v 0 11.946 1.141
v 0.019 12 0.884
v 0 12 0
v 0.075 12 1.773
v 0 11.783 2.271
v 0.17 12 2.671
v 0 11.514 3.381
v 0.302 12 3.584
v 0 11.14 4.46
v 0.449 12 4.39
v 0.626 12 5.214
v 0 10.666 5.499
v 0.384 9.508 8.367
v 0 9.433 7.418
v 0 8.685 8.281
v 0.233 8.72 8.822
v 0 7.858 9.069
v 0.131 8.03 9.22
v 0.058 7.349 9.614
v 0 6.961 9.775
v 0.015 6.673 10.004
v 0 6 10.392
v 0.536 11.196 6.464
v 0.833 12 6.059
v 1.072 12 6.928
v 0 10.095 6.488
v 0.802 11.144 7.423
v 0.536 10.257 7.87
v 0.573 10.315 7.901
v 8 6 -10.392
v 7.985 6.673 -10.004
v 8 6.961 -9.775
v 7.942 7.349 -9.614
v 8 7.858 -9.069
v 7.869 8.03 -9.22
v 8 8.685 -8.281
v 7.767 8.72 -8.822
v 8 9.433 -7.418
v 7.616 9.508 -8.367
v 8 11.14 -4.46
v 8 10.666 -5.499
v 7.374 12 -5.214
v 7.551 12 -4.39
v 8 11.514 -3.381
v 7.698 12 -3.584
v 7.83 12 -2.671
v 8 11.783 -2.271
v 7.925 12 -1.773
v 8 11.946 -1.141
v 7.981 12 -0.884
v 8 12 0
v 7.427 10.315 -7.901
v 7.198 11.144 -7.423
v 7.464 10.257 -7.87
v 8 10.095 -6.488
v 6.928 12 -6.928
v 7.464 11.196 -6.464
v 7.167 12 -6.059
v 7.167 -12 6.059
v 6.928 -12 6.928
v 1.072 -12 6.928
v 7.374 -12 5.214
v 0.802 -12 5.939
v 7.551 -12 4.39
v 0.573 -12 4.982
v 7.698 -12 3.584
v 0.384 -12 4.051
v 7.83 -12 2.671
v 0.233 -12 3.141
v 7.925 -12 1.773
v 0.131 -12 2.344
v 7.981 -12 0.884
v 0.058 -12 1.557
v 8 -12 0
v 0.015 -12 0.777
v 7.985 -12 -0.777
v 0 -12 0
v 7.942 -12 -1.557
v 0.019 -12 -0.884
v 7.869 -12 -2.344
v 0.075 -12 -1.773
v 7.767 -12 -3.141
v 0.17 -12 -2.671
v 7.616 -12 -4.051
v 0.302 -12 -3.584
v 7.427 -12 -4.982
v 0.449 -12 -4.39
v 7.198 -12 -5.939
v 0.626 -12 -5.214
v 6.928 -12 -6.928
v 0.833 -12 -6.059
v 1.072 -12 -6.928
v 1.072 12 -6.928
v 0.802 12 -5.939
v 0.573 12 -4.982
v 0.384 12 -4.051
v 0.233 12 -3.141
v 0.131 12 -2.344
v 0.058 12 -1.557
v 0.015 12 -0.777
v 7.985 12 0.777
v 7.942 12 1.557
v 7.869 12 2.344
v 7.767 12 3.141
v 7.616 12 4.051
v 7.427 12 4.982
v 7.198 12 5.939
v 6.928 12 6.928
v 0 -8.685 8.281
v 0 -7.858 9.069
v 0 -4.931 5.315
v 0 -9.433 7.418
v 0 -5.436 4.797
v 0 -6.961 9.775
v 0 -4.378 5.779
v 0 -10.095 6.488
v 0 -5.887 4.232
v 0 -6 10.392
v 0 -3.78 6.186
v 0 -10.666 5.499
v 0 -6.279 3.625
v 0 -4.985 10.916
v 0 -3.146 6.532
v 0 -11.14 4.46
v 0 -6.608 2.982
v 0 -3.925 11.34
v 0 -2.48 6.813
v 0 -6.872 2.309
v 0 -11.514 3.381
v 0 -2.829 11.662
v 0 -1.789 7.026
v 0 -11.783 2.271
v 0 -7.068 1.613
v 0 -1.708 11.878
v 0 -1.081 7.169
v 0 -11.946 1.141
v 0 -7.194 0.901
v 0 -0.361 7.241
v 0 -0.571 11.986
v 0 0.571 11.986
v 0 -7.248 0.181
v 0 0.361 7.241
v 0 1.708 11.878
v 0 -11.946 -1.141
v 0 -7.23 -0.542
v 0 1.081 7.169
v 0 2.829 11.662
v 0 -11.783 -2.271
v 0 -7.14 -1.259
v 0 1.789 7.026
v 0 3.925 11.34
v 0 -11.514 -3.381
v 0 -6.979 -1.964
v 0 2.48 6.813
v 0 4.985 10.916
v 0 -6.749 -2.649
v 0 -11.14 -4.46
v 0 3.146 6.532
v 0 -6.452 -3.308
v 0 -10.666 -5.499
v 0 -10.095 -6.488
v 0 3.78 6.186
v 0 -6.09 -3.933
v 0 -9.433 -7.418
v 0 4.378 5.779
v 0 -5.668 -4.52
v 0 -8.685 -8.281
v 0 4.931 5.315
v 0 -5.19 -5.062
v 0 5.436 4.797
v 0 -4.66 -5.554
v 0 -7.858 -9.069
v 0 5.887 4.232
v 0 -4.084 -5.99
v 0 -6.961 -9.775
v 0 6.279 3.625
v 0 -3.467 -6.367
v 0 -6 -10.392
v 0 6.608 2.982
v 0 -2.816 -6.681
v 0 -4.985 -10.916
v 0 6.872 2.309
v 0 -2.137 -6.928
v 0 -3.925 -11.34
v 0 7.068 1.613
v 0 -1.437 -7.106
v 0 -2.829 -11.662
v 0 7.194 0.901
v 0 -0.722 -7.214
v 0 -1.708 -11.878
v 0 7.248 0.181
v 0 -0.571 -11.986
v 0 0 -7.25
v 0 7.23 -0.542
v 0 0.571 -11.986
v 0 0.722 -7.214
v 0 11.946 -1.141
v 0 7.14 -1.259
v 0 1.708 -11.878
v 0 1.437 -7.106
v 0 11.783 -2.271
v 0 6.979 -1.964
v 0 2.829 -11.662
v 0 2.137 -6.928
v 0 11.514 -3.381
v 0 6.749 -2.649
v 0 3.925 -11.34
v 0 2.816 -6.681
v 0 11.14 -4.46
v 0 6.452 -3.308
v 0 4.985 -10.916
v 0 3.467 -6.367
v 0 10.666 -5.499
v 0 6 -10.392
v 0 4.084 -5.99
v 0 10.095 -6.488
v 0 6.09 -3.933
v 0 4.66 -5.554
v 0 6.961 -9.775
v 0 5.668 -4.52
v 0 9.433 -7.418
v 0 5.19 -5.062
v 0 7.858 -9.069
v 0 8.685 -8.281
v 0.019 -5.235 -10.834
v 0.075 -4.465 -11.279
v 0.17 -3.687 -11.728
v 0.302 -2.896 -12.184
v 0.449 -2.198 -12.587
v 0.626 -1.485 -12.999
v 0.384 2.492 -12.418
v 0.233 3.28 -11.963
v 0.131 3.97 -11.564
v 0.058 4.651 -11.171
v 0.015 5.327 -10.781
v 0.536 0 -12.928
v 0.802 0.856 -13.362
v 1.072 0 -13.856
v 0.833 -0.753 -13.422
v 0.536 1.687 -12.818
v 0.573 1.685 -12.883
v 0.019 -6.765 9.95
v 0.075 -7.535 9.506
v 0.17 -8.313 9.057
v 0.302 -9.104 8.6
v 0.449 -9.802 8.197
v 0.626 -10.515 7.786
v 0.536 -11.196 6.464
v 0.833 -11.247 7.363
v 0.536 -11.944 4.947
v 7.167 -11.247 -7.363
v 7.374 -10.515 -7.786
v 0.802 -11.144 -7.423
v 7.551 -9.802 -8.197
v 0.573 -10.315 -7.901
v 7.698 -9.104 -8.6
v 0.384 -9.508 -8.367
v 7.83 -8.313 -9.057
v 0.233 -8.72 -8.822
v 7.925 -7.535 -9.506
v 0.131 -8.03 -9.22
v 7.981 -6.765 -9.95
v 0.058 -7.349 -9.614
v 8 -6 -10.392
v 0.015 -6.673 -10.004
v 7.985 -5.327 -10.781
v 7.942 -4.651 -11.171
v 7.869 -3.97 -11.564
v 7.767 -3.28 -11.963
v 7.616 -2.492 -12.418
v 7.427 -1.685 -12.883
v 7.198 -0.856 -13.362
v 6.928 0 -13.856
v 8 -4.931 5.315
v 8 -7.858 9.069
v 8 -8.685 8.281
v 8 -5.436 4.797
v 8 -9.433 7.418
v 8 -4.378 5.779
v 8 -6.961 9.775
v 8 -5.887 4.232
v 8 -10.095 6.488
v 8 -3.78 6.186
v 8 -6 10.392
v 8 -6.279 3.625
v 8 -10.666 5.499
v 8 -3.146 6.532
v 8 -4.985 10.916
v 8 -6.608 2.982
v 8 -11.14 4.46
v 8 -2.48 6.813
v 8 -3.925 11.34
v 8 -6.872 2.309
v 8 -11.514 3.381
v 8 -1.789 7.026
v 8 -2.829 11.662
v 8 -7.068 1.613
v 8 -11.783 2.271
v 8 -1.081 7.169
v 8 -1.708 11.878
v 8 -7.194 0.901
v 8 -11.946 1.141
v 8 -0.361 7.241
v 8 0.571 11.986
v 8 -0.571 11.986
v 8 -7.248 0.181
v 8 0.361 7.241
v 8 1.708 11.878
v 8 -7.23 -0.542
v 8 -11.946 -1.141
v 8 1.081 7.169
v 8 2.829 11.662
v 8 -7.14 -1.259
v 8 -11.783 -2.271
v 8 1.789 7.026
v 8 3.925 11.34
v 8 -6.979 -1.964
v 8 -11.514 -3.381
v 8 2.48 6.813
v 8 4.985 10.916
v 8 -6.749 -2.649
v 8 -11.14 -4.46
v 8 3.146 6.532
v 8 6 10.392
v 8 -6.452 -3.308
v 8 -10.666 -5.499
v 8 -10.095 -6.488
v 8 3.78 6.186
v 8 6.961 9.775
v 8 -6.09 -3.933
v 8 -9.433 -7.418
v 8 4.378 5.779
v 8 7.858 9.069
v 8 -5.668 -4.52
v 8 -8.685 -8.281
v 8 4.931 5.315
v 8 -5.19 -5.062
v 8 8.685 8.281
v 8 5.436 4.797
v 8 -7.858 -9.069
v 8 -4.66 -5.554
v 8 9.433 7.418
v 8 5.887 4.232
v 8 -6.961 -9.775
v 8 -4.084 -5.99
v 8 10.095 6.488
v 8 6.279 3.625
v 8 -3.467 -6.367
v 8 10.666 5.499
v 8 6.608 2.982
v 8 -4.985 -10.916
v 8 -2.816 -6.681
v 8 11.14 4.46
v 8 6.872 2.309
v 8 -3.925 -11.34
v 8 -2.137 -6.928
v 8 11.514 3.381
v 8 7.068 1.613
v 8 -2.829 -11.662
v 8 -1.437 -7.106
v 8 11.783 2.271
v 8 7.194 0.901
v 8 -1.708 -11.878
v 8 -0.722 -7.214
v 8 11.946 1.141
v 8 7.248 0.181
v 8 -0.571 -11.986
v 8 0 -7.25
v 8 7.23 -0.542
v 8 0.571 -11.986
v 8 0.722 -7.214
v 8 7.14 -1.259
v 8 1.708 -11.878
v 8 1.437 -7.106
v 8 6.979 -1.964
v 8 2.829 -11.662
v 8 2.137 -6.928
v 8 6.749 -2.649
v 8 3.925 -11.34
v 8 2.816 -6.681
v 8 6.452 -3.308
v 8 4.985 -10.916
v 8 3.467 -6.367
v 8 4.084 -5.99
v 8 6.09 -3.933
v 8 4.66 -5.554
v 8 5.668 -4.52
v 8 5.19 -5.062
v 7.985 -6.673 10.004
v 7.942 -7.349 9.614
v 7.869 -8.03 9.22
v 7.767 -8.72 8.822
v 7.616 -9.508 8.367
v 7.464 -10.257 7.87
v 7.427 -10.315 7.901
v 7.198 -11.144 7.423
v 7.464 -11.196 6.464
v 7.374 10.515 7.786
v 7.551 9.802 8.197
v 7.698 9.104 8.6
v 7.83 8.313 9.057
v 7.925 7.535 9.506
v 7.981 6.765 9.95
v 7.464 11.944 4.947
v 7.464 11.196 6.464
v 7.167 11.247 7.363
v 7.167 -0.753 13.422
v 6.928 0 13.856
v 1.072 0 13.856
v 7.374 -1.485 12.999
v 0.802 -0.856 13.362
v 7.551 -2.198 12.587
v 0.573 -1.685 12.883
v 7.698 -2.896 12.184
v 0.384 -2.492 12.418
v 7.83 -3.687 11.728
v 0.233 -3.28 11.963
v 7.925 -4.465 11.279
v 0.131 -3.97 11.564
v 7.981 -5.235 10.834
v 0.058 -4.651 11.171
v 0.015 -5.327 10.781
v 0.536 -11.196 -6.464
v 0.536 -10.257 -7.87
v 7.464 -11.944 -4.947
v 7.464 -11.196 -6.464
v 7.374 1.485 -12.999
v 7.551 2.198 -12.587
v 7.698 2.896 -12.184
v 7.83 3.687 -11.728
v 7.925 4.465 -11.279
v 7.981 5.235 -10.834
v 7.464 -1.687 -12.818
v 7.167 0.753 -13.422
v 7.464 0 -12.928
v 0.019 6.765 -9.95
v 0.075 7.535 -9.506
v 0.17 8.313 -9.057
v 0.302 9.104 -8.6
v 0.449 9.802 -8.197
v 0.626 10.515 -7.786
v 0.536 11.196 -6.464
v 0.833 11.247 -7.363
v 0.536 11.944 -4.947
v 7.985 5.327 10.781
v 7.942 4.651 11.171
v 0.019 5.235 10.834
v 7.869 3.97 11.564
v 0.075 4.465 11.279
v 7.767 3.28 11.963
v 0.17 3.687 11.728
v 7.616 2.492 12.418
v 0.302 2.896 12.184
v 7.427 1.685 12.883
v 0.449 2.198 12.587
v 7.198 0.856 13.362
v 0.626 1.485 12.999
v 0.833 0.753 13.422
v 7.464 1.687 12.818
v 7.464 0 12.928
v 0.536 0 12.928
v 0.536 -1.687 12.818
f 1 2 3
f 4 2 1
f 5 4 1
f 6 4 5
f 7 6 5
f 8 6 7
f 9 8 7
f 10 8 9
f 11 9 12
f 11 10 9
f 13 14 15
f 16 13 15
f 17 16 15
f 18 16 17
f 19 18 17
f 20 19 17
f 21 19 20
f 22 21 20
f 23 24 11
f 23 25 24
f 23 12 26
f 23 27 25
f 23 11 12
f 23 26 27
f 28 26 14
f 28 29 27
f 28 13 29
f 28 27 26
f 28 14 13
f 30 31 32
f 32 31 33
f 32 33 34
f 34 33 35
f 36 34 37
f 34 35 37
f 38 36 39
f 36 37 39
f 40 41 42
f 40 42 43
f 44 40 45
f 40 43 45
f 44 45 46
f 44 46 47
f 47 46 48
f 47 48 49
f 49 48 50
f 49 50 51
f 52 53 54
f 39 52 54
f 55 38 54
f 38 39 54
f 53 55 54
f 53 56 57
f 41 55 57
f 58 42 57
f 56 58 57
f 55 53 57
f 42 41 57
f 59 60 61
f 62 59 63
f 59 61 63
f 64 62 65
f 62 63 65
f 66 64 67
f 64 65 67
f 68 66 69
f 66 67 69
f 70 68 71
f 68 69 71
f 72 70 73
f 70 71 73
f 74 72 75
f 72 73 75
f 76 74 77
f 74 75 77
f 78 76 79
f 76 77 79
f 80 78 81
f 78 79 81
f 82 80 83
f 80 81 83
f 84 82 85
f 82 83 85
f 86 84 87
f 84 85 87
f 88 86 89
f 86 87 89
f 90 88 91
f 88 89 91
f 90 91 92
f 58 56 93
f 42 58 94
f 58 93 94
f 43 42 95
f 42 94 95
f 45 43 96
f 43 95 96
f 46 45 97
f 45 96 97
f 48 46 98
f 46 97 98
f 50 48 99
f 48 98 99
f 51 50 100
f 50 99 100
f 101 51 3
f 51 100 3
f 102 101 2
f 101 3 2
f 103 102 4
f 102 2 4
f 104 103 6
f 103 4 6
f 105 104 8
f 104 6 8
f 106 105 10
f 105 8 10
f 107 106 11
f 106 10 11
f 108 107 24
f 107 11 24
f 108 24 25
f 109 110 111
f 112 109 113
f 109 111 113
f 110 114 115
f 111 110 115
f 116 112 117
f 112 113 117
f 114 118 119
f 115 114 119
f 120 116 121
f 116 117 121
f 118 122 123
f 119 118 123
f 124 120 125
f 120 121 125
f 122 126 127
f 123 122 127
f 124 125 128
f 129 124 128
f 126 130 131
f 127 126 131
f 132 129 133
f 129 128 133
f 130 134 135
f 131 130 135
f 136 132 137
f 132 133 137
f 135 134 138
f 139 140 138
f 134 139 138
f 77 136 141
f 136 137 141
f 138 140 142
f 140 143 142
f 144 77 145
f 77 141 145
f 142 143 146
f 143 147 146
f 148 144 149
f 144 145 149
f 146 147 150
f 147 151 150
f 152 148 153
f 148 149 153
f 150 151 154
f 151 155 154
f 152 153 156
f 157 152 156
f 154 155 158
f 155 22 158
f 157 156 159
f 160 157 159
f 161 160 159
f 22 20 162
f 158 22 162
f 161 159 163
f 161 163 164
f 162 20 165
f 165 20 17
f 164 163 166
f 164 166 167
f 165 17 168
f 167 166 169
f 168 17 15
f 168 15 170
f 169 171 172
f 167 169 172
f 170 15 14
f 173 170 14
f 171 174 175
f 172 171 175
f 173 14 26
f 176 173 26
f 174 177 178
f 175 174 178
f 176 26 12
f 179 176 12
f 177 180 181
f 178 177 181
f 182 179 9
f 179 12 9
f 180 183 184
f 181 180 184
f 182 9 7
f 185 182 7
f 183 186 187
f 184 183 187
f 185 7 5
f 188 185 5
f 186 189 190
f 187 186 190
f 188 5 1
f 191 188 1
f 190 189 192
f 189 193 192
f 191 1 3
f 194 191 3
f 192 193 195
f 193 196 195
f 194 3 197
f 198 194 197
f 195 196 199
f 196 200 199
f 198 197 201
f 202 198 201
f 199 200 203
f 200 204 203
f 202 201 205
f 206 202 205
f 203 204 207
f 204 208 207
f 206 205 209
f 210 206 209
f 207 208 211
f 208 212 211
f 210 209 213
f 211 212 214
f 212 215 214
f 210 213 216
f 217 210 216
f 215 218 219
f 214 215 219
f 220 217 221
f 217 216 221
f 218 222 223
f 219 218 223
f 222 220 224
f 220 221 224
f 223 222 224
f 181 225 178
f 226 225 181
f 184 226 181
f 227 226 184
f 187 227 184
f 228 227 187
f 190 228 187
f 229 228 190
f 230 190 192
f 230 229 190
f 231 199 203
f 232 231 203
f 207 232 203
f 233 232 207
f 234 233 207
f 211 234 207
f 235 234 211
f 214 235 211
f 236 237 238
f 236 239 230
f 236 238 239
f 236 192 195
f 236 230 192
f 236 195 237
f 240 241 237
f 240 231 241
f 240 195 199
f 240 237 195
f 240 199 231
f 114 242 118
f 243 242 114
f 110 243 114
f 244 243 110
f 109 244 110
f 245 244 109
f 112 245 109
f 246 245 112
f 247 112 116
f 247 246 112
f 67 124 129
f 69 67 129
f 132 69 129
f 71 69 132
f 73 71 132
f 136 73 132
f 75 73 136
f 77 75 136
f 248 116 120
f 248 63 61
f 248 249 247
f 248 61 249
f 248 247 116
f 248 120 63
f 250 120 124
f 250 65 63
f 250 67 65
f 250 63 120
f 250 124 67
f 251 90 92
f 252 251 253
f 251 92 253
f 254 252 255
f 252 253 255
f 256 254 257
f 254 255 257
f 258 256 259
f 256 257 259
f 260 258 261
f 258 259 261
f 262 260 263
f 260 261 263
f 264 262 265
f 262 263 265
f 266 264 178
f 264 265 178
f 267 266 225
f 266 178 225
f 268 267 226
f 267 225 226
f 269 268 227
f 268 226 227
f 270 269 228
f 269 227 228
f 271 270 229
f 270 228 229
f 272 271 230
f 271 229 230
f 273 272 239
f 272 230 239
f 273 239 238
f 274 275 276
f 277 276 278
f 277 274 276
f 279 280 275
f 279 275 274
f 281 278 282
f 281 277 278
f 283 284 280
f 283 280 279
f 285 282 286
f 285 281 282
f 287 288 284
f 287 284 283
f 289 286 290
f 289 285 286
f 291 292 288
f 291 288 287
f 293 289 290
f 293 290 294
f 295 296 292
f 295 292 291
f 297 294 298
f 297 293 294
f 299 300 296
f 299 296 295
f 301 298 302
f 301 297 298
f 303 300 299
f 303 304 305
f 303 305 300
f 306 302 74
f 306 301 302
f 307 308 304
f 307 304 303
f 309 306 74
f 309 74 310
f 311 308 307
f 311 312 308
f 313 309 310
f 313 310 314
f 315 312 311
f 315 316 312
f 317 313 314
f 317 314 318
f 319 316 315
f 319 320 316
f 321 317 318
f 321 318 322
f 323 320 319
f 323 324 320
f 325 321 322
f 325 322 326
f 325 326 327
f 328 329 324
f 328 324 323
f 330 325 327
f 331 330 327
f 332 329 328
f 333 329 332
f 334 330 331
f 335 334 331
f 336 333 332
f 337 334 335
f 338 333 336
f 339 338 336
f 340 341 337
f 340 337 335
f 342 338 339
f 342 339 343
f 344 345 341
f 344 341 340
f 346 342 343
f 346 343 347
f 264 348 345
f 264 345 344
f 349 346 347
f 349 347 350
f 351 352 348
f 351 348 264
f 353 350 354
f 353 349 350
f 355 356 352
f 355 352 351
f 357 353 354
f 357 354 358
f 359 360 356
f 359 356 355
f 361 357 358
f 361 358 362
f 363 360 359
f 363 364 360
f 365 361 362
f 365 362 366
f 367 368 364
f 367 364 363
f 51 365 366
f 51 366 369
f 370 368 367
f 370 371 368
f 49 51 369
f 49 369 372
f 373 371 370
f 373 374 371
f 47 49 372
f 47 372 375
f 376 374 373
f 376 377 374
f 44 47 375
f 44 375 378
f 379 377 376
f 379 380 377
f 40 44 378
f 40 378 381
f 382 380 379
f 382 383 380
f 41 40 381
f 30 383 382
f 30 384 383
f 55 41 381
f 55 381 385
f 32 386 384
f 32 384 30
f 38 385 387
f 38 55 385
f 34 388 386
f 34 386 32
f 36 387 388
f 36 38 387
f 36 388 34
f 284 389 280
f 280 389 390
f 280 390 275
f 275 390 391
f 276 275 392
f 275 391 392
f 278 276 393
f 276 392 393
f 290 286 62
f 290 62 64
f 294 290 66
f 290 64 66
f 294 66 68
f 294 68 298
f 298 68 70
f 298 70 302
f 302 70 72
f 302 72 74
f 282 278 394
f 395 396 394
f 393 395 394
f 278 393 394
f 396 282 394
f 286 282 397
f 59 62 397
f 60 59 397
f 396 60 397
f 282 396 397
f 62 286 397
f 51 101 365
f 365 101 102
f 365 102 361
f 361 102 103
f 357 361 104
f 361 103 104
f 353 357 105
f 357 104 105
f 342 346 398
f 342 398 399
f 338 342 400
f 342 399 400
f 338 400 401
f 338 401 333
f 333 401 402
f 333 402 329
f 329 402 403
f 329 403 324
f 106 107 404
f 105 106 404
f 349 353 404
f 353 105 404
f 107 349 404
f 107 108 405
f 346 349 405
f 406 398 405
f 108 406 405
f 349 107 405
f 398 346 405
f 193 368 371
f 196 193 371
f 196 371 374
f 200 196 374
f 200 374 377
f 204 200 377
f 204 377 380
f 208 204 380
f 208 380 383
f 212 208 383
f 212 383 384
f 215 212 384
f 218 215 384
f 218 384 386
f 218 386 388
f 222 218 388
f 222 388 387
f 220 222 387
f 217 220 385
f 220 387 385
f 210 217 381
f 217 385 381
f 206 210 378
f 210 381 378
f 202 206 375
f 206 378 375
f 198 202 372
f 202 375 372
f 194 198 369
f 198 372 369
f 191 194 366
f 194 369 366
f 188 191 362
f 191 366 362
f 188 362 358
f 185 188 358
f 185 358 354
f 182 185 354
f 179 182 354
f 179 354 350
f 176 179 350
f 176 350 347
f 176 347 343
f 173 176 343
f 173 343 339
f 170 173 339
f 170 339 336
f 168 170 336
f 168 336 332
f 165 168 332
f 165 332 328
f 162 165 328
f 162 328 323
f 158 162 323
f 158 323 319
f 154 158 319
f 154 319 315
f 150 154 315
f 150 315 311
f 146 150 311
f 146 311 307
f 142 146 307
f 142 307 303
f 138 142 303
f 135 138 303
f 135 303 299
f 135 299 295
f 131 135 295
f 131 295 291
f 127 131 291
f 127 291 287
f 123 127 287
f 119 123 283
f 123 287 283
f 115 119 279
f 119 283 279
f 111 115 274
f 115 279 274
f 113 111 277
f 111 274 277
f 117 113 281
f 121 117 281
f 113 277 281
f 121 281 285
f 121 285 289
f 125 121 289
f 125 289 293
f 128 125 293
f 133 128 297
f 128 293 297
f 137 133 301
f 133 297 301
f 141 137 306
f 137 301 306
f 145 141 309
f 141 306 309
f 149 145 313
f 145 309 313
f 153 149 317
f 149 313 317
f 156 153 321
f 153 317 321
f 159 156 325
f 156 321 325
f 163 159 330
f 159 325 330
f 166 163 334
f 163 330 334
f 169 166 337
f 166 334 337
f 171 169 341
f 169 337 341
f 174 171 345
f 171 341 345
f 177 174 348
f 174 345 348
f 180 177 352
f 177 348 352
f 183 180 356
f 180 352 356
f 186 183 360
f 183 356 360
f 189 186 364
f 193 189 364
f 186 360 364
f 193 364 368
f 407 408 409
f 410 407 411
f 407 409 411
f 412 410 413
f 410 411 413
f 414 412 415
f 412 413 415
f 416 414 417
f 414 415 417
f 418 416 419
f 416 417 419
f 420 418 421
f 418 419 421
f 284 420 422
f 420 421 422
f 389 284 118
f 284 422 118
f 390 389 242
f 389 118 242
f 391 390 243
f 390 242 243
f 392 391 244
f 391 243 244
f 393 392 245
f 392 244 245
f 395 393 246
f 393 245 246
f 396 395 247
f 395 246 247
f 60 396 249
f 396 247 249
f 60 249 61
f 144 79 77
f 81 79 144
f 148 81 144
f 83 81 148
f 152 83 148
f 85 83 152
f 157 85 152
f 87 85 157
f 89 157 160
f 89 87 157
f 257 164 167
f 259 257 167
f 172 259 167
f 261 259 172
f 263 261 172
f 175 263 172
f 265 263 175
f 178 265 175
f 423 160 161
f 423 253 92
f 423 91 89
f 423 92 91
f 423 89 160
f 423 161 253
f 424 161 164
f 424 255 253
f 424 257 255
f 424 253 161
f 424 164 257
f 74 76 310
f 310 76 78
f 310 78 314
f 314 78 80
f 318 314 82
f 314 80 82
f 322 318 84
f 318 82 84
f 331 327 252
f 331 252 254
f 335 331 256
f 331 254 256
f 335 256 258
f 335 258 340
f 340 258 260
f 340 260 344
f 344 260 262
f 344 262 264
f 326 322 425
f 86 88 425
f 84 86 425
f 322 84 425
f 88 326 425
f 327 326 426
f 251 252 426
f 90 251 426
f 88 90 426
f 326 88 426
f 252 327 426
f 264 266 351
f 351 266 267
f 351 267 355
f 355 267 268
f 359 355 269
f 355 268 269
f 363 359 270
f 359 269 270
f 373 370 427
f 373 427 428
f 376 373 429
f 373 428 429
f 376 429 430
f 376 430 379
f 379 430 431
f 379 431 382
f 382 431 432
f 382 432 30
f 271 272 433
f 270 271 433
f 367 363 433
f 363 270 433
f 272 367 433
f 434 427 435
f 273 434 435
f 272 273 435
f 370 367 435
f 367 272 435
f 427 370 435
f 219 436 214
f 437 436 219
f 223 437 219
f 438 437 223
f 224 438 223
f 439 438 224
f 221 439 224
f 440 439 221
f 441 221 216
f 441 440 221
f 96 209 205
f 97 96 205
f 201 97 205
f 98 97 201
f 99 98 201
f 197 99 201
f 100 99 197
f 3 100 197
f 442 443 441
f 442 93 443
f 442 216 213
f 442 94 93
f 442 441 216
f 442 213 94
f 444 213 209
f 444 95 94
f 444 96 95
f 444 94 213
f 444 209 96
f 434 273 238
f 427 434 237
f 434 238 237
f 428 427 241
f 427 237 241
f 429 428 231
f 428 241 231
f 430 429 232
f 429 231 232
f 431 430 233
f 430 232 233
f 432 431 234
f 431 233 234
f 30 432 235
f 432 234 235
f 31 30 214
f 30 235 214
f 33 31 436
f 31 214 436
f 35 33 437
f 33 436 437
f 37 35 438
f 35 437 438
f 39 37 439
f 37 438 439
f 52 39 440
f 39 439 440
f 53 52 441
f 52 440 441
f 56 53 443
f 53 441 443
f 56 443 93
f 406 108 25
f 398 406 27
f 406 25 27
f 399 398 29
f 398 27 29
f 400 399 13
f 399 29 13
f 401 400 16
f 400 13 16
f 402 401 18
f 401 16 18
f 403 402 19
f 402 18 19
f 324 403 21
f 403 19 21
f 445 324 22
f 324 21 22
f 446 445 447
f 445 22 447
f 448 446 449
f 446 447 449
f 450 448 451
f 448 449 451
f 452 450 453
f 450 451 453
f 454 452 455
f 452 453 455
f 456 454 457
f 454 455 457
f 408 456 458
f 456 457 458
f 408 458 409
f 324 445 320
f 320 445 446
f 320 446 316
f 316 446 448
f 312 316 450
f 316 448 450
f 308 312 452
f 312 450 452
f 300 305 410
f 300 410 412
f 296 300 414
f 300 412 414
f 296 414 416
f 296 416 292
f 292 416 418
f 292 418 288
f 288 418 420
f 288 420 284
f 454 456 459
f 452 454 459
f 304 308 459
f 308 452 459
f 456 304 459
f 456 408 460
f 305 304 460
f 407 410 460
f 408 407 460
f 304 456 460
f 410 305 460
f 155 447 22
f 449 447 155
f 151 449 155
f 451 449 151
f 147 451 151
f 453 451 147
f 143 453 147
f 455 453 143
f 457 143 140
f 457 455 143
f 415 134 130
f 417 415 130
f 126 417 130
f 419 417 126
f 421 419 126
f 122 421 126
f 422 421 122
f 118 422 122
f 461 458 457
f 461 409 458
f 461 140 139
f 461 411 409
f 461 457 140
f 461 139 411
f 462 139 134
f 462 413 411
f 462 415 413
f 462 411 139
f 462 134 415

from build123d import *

# Parameters (mm, degrees)
BOSS_EXTRUDE1_DEPTH = 8
TAPPED_HOLE1_D      = 14.5


with BuildPart() as part:
    # Sketch1 → Boss-Extrude1 (new body)
    with BuildSketch(Plane(origin=(0, 0, 0), x_dir=(0, 0, -1), z_dir=(1, 0, 0))):
        Polygon((13.856406461, 0), (6.92820323, 12), (-6.92820323, 12), (-13.856406461, 0), (-6.92820323, -12), (6.92820323, -12), align=None)
    extrude(amount=BOSS_EXTRUDE1_DEPTH)

    # Tapped Hole1 (through all)
    with Locations(Plane.ZY):
        with Locations((0, 0)):
            Hole(TAPPED_HOLE1_D / 2)

    # Sketch6 → Cut-Revolve1 (revolve, cut)
    with BuildSketch(Plane(origin=(0, 0, 0), x_dir=(1, 0, 0), z_dir=(0, 1, 0))):
        Polygon((0, 12), (1.07179677, 13.856406461), (0, 13.856406461), align=None)
    cut_revolve1 = revolve(axis=Axis((0, 0, 0), (1, 0, 0)), mode=Mode.SUBTRACT)

    # Mirror1: Cut-Revolve1 across plane
    add(cut_revolve1.mirror(Plane.ZY.offset(-4)), mode=Mode.SUBTRACT)


solid = part.part
